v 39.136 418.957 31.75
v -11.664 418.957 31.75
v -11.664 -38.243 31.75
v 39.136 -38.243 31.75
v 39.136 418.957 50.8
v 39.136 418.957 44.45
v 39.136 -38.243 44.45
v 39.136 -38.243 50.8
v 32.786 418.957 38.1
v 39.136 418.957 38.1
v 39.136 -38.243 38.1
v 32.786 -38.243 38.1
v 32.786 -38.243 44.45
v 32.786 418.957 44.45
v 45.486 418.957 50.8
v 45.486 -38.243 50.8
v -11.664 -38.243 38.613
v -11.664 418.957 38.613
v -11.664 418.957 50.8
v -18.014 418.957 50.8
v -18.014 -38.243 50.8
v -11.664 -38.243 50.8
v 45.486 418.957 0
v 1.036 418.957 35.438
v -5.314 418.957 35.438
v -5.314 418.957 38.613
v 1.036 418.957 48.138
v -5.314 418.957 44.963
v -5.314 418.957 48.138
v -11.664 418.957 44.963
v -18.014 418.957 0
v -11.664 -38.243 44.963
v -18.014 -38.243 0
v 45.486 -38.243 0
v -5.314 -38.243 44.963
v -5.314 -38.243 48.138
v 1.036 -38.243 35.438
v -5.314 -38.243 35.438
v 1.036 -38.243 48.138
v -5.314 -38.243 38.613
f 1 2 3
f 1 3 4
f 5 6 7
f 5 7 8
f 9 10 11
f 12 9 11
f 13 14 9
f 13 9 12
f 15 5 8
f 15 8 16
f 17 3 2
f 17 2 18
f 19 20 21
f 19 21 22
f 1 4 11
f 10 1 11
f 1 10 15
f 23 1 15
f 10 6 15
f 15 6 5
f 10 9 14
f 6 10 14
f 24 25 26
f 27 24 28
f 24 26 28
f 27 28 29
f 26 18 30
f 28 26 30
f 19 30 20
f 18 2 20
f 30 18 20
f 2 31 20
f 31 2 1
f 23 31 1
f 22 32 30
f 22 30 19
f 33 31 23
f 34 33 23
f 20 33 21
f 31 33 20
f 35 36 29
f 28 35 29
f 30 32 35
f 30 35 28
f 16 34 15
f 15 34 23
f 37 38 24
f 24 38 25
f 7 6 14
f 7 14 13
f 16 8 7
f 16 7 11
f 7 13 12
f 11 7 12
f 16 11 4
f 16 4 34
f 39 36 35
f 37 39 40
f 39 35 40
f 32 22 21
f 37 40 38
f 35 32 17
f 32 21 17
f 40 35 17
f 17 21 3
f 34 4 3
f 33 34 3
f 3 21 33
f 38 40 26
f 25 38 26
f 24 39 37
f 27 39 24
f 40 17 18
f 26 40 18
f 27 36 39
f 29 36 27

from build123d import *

# Parameters (mm, degrees)
F0_W     = 63.5
F0_H     = 457.2
F1_DEPTH = 50.8
F2_W     = 50.8
F2_H     = 19.05
F3_DEPTH = 457.2
F4_W     = 457.2
F4_H     = 6.35
F5_DEPTH = 6.35
F6_W     = 457.2
F6_H     = 3.175
F6_H_2   = 6.35
F7_DEPTH = 6.35
F8_W     = 457.2
F8_H     = 6.35
F9_DEPTH = 6.35


with BuildPart() as f1:
    # F0 (on Top) → F1 (new body)
    with BuildSketch(Plane.XY):
        with Locations((13.7360737771, 190.3568813264)):
            Rectangle(F0_W, F0_H)
    extrude(amount=F1_DEPTH)

    # F2 (on face) → F3 (cut)
    with BuildSketch(Plane.XZ.offset(38.2431186736)):
        with Locations((13.7360737771, 41.275)):
            Rectangle(F2_W, F2_H)
    extrude(amount=-F3_DEPTH, mode=Mode.SUBTRACT)

    # F4 (on face) → F5 (join)
    with BuildSketch(Plane.YZ.offset(-11.6639262229)):
        with Locations((190.3568813264, 41.787626493)):
            Rectangle(F4_W, F4_H)
    extrude(amount=F5_DEPTH)

    # F6 (on face) → F7 (join)
    with BuildSketch(Plane.YZ.offset(-5.3139262229)):
        with Locations((190.3568813264, 46.550126493)):
            Rectangle(F6_W, F6_H)
        with Locations((190.3568813264, 41.787626493)):
            Rectangle(F6_W, F6_H_2)
        with Locations((190.3568813264, 37.025126493)):
            Rectangle(F6_W, F6_H)
    extrude(amount=F7_DEPTH)

    # F8 (on face) → F9 (join)
    with BuildSketch(Plane(origin=(39.1360737771, 0, 0), x_dir=(0, -1, 0), z_dir=(-1, 0, 0))):
        with Locations((-190.3568813264, 41.275)):
            Rectangle(F8_W, F8_H)
    extrude(amount=F9_DEPTH)


solid = f1.part
